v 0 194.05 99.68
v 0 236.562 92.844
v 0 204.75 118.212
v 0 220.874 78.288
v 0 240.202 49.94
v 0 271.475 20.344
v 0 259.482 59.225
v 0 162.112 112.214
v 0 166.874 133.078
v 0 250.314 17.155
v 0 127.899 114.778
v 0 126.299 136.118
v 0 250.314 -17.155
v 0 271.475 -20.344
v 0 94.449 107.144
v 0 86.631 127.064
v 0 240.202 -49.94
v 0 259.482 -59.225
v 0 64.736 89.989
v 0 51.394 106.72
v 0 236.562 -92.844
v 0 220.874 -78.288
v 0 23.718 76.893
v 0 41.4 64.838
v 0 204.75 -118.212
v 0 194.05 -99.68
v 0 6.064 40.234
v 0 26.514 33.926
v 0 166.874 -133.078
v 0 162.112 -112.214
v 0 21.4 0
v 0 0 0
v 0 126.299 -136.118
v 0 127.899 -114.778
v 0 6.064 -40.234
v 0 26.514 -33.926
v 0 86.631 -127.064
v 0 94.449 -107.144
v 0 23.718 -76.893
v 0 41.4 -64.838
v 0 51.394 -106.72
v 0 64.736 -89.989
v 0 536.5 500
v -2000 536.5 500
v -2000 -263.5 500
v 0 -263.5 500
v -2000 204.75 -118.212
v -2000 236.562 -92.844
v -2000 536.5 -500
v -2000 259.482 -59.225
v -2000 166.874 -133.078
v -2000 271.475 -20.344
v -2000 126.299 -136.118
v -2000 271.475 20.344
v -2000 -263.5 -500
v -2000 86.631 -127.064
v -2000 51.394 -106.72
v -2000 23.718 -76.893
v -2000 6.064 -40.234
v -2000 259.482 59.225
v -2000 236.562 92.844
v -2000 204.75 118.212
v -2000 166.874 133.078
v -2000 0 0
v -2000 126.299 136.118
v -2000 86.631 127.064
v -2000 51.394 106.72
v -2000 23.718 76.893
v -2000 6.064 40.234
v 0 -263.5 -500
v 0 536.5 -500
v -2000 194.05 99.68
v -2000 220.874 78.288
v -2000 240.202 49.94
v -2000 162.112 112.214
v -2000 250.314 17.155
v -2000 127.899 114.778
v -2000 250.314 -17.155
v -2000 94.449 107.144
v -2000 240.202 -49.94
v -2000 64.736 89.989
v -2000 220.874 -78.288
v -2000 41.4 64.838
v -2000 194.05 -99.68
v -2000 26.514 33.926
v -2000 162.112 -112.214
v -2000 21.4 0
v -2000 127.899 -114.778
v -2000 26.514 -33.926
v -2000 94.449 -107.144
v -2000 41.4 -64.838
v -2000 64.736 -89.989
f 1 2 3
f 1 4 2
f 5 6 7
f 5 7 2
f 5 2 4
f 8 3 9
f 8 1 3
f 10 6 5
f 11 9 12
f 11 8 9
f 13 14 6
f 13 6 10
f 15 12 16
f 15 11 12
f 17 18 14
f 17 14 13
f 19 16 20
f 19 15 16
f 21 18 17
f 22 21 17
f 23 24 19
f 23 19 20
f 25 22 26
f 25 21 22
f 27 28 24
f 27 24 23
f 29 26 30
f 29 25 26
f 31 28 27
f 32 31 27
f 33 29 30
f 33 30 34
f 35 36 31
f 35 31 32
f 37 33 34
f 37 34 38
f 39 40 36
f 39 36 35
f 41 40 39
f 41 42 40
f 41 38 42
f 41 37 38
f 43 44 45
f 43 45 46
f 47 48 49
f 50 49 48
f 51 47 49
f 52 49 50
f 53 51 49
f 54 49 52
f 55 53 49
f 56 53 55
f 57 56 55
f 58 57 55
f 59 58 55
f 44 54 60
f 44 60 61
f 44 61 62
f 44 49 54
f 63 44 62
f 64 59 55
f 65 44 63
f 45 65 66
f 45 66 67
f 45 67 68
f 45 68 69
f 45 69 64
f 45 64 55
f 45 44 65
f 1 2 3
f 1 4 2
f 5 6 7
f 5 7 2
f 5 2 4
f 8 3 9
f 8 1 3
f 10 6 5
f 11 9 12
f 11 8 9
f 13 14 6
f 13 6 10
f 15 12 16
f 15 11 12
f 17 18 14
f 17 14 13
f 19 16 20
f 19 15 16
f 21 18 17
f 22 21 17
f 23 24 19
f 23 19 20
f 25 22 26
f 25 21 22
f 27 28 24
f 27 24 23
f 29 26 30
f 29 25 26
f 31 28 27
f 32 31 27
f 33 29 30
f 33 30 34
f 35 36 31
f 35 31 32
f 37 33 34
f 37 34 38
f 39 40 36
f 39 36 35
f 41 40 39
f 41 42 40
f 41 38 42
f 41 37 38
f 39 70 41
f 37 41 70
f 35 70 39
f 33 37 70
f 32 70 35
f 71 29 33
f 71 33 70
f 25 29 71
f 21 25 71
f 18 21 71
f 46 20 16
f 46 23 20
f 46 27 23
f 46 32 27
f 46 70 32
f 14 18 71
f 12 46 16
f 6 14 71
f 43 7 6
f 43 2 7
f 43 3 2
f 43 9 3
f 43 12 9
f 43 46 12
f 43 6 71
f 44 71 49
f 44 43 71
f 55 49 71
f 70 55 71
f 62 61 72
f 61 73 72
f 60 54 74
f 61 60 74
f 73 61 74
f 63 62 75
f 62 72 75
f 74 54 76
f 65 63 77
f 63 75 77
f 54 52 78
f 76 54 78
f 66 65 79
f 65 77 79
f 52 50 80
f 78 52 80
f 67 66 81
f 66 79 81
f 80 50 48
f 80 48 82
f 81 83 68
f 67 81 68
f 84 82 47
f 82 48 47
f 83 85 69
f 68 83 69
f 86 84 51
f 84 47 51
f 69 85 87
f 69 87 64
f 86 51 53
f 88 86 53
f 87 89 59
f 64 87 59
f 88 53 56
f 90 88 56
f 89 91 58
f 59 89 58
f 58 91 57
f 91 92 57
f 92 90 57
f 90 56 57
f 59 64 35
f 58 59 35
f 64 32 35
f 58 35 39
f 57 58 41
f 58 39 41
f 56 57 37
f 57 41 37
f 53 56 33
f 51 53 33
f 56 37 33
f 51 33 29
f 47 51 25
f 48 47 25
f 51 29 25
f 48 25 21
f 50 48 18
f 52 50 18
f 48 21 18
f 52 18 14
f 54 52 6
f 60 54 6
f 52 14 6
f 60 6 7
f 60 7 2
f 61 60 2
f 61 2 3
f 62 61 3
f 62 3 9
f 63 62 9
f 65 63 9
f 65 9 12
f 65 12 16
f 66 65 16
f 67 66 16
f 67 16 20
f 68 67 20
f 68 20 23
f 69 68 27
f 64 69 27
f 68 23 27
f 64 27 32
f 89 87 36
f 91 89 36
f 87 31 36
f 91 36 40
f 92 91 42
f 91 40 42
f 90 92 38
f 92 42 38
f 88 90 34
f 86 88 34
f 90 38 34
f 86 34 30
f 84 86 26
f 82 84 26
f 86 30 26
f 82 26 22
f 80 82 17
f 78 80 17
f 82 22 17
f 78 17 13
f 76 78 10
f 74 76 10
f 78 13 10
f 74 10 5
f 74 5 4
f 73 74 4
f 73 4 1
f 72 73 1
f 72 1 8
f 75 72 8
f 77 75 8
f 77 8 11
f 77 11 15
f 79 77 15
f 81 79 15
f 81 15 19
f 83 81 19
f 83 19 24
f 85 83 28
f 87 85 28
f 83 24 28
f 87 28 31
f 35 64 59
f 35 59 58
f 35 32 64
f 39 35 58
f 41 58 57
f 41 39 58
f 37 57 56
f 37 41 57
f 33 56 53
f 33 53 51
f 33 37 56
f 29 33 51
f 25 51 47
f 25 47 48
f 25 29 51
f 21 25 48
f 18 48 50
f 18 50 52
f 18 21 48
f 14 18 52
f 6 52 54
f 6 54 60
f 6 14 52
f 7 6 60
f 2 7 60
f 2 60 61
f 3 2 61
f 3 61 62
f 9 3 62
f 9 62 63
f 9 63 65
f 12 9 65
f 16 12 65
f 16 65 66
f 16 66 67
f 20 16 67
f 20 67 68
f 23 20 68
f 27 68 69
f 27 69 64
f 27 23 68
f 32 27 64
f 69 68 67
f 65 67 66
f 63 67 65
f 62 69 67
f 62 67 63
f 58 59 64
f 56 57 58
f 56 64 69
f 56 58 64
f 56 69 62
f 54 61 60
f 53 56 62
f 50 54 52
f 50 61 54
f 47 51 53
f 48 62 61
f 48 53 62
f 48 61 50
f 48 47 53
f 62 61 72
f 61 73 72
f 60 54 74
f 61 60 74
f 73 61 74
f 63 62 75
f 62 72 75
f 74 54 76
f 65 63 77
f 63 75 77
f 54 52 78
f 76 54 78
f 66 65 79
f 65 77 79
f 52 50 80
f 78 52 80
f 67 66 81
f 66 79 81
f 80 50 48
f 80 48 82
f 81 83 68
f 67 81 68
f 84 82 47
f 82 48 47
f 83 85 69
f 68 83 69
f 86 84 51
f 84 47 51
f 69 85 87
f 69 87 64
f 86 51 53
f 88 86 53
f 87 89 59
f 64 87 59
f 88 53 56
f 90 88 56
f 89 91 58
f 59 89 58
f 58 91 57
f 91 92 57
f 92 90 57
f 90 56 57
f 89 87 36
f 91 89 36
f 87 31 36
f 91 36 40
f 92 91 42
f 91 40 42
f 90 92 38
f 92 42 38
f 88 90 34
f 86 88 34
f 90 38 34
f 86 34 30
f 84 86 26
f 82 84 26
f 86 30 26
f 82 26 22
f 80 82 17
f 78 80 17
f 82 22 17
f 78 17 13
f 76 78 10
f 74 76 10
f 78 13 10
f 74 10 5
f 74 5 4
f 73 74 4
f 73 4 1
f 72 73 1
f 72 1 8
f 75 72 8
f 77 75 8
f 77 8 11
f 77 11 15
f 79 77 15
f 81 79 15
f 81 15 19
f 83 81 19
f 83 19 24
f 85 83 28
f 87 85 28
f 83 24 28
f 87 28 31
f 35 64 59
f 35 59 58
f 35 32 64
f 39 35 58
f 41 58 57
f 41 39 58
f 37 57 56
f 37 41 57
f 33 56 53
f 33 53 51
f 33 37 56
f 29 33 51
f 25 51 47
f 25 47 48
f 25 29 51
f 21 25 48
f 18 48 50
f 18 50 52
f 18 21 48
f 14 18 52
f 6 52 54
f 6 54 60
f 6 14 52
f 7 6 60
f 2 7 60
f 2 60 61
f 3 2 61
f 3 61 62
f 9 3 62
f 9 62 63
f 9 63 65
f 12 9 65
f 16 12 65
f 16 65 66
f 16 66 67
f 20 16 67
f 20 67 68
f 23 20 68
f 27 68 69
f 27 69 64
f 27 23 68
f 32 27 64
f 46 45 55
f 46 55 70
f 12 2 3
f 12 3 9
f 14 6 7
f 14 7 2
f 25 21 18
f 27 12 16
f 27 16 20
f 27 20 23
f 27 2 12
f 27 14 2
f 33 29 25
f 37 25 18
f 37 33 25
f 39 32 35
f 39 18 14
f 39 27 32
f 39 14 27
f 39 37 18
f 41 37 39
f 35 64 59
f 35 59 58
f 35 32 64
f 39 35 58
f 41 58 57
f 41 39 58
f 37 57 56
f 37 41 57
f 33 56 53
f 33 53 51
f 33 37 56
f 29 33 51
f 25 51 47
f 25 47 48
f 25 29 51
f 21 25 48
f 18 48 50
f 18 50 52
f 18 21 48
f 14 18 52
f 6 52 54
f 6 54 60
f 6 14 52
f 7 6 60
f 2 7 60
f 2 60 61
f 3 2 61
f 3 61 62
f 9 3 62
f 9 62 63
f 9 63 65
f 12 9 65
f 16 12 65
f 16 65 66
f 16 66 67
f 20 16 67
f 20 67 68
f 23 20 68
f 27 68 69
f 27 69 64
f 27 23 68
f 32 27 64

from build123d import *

# Parameters (mm, degrees)
F0_W     = 2000
F0_H     = 21.4
F0_H_2   = 115.1
F0_H_3   = 263.5
F2_DEPTH = 500


with BuildPart() as f1:
    # F0 (on Top) → F1 (revolve)
    with BuildSketch(Plane.XY):
        with Locations((-1000, 10.7)):
            Rectangle(F0_W, F0_H)
        with Locations((-1000, 78.95)):
            Rectangle(F0_W, F0_H_2)
    revolve(axis=Axis((-1000, 136.5, 0), (1, 0, 0)))


with BuildPart() as f2:
    # F0 (on Top) → F2 (new body, symmetric)
    with BuildSketch(Plane.XY):
        Polygon((-2000, 136.5), (0, 136.5), (0, 300), (0, 536.5), (-2000, 536.5), align=None)
        with Locations((-1000, -131.75)):
            Rectangle(F0_W, F0_H_3)
        with Locations((-1000, 78.95)):
            Rectangle(F0_W, F0_H_2)
        with Locations((-1000, 10.7)):
            Rectangle(F0_W, F0_H)
    extrude(amount=F2_DEPTH, both=True)

    # F3: cut F1
    add(f1.part, mode=Mode.SUBTRACT)


with BuildPart() as f4:
    # F0 (on Top) → F4 (revolve)
    with BuildSketch(Plane.XY):
        with Locations((-1000, 10.7)):
            Rectangle(F0_W, F0_H)
    revolve(axis=Axis((-1000, 136.5, 0), (1, 0, 0)))


with BuildPart() as f5:
    # F0 (on Top) → F5 (revolve)
    with BuildSketch(Plane.XY):
        with Locations((-1000, 10.7)):
            Rectangle(F0_W, F0_H)
    revolve(axis=Axis((-1000, 136.5, 0), (1, 0, 0)))


solid = Compound([f1.part, f2.part, f4.part, f5.part])
